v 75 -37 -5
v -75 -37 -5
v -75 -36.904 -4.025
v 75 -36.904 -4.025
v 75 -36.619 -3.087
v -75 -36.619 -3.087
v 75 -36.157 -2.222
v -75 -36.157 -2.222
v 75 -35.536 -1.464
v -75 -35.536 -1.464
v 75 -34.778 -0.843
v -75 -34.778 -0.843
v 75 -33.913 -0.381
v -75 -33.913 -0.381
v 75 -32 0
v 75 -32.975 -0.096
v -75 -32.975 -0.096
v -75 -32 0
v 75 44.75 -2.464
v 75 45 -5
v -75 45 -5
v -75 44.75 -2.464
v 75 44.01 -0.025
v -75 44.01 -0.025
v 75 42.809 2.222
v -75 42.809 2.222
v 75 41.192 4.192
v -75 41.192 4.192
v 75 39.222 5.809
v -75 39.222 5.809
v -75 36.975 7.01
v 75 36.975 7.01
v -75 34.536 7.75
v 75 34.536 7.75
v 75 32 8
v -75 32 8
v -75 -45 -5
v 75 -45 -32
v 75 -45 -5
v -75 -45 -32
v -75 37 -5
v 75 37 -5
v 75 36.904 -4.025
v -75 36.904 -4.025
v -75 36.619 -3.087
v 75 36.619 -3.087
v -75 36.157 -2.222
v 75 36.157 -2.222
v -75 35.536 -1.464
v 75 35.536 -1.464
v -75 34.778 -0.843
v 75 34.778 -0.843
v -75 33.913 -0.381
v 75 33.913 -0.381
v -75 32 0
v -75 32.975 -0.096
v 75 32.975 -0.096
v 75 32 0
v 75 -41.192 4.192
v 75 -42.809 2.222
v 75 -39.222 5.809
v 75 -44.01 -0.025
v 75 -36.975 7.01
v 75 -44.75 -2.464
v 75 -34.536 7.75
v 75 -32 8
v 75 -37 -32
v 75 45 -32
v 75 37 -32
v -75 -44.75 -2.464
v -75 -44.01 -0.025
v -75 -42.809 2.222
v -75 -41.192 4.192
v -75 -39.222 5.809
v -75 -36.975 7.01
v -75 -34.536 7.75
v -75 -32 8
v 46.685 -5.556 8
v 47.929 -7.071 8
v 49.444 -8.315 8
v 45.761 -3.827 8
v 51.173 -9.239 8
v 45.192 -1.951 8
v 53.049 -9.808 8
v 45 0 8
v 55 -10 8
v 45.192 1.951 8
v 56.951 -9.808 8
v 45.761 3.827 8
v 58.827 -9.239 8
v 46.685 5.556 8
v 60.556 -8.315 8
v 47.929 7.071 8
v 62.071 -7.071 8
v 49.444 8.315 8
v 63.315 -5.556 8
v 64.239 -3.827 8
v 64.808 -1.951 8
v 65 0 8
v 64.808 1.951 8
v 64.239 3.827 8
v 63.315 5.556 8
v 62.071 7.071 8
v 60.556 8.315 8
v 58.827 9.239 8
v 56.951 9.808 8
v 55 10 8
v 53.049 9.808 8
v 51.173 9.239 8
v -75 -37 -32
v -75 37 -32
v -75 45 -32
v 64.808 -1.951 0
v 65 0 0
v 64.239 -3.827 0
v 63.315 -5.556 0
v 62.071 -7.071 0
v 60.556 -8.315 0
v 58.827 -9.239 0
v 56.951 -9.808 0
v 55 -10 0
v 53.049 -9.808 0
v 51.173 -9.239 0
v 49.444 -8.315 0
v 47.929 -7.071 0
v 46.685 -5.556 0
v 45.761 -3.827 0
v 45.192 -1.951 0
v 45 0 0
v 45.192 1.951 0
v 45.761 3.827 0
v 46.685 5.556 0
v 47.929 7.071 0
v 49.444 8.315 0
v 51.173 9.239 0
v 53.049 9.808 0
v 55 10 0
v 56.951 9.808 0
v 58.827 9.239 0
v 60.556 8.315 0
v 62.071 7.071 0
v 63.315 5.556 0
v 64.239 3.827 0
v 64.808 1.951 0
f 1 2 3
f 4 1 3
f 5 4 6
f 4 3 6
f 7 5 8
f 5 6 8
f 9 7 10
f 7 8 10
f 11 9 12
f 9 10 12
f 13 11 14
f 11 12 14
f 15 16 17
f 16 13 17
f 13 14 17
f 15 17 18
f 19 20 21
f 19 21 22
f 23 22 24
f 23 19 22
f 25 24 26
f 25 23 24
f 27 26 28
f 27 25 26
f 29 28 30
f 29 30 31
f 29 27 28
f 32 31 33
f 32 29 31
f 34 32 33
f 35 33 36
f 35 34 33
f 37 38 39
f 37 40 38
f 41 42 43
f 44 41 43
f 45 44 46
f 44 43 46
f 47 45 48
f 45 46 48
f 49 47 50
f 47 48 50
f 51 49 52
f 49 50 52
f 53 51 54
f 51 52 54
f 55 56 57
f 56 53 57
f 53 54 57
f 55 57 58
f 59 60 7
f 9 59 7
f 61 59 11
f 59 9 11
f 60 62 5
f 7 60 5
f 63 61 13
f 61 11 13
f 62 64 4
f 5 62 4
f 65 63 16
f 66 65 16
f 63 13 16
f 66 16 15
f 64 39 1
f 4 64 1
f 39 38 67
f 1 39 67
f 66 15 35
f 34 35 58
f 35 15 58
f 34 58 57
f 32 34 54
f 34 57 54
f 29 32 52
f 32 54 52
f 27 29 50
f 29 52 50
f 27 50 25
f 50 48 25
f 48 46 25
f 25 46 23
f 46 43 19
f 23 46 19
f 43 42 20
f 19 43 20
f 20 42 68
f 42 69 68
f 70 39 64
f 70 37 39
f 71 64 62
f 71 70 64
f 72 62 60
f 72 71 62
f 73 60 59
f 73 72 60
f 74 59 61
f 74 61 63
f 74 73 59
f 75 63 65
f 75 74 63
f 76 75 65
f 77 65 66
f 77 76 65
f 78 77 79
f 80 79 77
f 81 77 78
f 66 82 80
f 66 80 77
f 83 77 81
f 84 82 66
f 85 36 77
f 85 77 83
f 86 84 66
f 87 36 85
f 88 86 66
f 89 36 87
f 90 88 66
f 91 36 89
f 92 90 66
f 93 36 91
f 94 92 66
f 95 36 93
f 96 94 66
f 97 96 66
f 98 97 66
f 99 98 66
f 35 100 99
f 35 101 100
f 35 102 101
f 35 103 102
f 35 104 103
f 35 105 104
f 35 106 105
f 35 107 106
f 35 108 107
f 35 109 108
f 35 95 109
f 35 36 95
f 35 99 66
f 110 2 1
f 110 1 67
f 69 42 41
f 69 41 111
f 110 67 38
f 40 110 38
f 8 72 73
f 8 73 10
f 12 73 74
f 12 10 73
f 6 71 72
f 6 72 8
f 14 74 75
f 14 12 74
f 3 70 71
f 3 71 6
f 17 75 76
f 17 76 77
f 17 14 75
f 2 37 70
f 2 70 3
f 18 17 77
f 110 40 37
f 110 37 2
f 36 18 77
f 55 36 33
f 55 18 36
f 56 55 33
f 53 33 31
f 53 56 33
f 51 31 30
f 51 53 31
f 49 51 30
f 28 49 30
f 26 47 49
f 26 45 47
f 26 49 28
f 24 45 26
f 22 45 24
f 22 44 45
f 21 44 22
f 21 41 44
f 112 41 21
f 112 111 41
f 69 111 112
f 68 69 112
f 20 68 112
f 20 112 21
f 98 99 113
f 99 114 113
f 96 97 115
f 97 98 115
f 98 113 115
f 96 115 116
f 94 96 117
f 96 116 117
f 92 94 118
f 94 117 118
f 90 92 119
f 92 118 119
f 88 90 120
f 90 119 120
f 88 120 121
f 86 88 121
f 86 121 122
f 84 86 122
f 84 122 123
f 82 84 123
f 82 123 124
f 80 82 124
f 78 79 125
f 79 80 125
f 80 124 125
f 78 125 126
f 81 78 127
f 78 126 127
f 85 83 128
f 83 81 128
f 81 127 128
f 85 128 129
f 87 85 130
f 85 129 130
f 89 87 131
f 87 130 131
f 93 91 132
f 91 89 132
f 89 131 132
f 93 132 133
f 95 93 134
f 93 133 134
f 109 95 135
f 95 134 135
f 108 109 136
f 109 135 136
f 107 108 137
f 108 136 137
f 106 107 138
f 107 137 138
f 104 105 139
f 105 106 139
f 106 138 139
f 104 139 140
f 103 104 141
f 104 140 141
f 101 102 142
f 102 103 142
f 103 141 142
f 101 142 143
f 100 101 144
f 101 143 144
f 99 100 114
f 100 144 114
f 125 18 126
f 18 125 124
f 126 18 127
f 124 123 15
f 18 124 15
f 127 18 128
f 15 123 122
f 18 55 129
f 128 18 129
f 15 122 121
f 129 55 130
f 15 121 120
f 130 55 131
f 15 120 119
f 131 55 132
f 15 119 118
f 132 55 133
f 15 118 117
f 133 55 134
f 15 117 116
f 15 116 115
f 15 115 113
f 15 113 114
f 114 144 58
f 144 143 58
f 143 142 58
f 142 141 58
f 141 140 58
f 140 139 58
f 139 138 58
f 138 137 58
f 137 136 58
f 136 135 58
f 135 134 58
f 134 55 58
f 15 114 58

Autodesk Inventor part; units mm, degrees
ref_plane "YZ Plane" through (0, 0, 0) normal (1, 0, 0) x (0, 1, 0)
ref_plane "XZ Plane" through (0, 0, 0) normal (0, 1, 0) x (-1, 0, 0)
ref_plane "XY Plane" through (0, 0, 0) normal (0, 0, 1) x (1, 0, 0)
sketch "Sketch1" plane through (0, 0, 0) normal (0, 0, 1) x (1, 0, 0)
  line L0 (-75, -45) -> (75, -45)
  line L1 (75, -45) -> (75, 45)
  line L2 (75, 45) -> (-75, 45)
  line L3 (-75, 45) -> (-75, -45)
  line L4 (-75, -45) -> (75, 45) construction
  line L5 (75, -45) -> (-75, 45) construction
  circle A0 centre (55, -25) radius 10
  circle A1 centre (55, 25) radius 10
  line L6 (0, 0) -> (75, 0) construction
  circle A2 centre (55, 0) radius 10
  dimension "d0" = 150
  dimension "d1" = 90
  dimension "d23" = 20
  dimension "d25" = 20
  dimension "d26" = 20
extrude "Plate1" add sketch "Sketch1" along normal blind 8 contours L3 L2 L1 L0 | A0 | A1
sketch "Sketch6" plane through (-75, -37, 8) normal (0, -1, 0) x (1, 0, 0)
  line L0 (150, 0) -> (0, 0)
  line L1 (0, 0) -> (0, -40)
  line L2 (0, -40) -> (150, -40)
  line L3 (150, -40) -> (150, 0)
edge flange "Flange2" height 40 angle 90 thickness 8 bend radius 5 thickness toward (0, -1, 0) relief round relief width 8 relief depth 4 corner gap 5 corner form 0 edges at (0, -45, 0) (0, 45, 0) wall of the first edge with corners at (75, -37, 8) (-75, -37, 8) (-75, -37, -32) (75, -37, -32)
bend "Bend2"
corner "Corner2"
equation "\"d26\" = d25"
equation "\"d2\" = Thickness"
equation "\"d30\" = BendReliefWidth"
equation "\"d31\" = BendReliefDepth"
equation "\"d32\" = MinimumRemnant"
equation "\"d33\" = TransitionRadius"
equation "\"d36\" = BendRadius"
equation "\"d37\" = CornerReliefSize"
equation "\"d38\" = GapSize"
equation "\"d39\" = JacobiRadiusSize"
equation "\"BendReliefWidth\" = Thickness"
equation "\"BendReliefDepth\" = 0.5 * Thickness"
equation "\"CornerReliefSize\" = 4 * Thickness"
equation "\"MinimumRemnant\" = 2 * Thickness"
equation "\"TransitionRadius\" = BendRadius"
equation "\"JacobiRadiusSize\" = BendRadius"
equation "\"GapSize\" = Thickness"
equation "\"Thickness\" = 8"
equation "\"BendRadius\" = 5"
properties part number "PNS 1785 leg floor channel_1200" material "Steel"
